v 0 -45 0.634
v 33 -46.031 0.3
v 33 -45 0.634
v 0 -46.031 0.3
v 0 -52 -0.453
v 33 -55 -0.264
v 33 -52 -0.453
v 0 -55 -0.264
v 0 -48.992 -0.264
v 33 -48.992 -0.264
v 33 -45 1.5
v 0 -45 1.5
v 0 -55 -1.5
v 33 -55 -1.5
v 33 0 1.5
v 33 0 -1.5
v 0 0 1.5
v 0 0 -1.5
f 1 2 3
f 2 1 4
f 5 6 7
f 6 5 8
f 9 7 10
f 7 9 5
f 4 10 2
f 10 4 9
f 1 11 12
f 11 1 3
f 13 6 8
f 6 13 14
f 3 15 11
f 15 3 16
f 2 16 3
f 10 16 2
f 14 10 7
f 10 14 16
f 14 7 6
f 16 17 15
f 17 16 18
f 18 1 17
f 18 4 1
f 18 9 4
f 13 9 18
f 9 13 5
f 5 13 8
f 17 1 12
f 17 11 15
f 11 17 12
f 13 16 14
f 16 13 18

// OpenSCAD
// file: porte-balles.scad
include <dimensions.scad>

included=false; // this value will be overriden in the including file
included_in_attache=false; // this value will be overriden in the including file
included_in_sommet=false; // this value will be overriden in the including file


module balle()
{
    sphere(d=d);
}

module cubes_montants() 
{
    translate ([d/2+e+jeu/2-l_m/2,-d/2-e-jeu/2,0]) 
        cube([l_m,d+2*e+jeu, h_m+encastrement]);
    translate ([3*d/2+2*e+jeu/2-l_m/2,-d/2-e-jeu/2,0]) 
        cube([l_m,d+2*e+jeu, h_m+encastrement]);
}


module montants() {
    intersection () {
        difference() {
            enveloppe_ext(hull=false);
            enveloppe_int(hull=true);
        }
        cubes_montants();
    }
}

module porte_balles()
{
    intersection () {
        enveloppe(hull=true);
        union () {
            // ceinture basse
            translate ([0,-d/2-e-jeu/2,0]) 
                cube([2*d+3*e+jeu,d+2*e+jeu, h_cb]);
        }
    }
    // montants
    montants();
    
    if (included) {
        translate ([d/2+e+jeu/2,0,delta_h])
            balle();
        translate ([d/2+e+d+e+jeu/2,0,delta_h])
            balle();
    }
}

module grandes_spheres() {
    translate([d/2+e+jeu/2,0,delta_h])
        sphere(d=d+2*e+jeu);
    translate([d/2+e+d+e+jeu/2,0,delta_h])
        sphere(d=d+2*e+jeu);
}

module petites_spheres() {
    translate([d/2+e+jeu/2,0,delta_h])
        sphere(d=d+jeu);
    translate([d/2+e+d+e+jeu/2,0,delta_h])
        sphere(d=d+jeu);
}

module enveloppe_ext(hull) {
    if (hull) {
        hull () grandes_spheres();
    } else {
        grandes_spheres();
    }
}

module enveloppe_int(hull) {
    if (hull) {
        hull () petites_spheres();
    } else {
        petites_spheres();
    }
}

module enveloppe(hull)
{
    intersection () {
        difference () {
            enveloppe_ext(hull);
            enveloppe_int(hull);            
        }
        translate ([0,-d/2-e-jeu/2,0])
            cube([2*d+3*e+jeu,d+2*e+jeu,d /* suffisamment haut */]);
    }
}
    
if (!included && !included_in_sommet && !included_in_attache) {
    porte_balles();
} 
// file: dimensions.scad
epsilon = 0.1; // utilisé pour éviter que les évidements se fassent mal
jeu = 2; // jeu à prévoir 

encastrement = 1; // encastrements a coller

w = 50; // largeur intérieure du puits
l = 73; // longueur intérieure du puits
h = 15; // hauteur du puits
e = 3; // epaisseur du puits
h_cb = 10; // hauteur ceinture basse
delta_h = 7; // hauteur supplementaire a prevoir en dessous du milieu des balles pour qu'elles soient retenues dans la cage


ha = 40; //hauteur de l'attache, entre le puits et le porte balles

d = 40; // diamètre des balles de ping pong

l_m = 10; // largeur des montants
h_m = 20; // hauteur des montants

$fn=50;
// main file
include <dimensions.scad>

include <porte-balles.scad>

included=false; // this value will be overriden in the including file
included_in_puits=false; // this value will be overriden in the including file

included_in_attache=true; // this value will override the ones in the include files

  
module attache(pos)
{
    la = min(l-w/2+e, d + e /*largeur porte_balle*/) - 10; // longueur attache
    translate(pos) 
        translate([0,-e/2,0]) 
            cube([la, e, ha+h]);    
}



if (!included && !included_in_puits) {
    rotate([90,0,0]) 
        difference () {
            attache();
            translate ([-(d/2+e+jeu/2),d/2+e/2+e-encastrement,ha+h-h_cb])
             porte_balles();
        }
}
